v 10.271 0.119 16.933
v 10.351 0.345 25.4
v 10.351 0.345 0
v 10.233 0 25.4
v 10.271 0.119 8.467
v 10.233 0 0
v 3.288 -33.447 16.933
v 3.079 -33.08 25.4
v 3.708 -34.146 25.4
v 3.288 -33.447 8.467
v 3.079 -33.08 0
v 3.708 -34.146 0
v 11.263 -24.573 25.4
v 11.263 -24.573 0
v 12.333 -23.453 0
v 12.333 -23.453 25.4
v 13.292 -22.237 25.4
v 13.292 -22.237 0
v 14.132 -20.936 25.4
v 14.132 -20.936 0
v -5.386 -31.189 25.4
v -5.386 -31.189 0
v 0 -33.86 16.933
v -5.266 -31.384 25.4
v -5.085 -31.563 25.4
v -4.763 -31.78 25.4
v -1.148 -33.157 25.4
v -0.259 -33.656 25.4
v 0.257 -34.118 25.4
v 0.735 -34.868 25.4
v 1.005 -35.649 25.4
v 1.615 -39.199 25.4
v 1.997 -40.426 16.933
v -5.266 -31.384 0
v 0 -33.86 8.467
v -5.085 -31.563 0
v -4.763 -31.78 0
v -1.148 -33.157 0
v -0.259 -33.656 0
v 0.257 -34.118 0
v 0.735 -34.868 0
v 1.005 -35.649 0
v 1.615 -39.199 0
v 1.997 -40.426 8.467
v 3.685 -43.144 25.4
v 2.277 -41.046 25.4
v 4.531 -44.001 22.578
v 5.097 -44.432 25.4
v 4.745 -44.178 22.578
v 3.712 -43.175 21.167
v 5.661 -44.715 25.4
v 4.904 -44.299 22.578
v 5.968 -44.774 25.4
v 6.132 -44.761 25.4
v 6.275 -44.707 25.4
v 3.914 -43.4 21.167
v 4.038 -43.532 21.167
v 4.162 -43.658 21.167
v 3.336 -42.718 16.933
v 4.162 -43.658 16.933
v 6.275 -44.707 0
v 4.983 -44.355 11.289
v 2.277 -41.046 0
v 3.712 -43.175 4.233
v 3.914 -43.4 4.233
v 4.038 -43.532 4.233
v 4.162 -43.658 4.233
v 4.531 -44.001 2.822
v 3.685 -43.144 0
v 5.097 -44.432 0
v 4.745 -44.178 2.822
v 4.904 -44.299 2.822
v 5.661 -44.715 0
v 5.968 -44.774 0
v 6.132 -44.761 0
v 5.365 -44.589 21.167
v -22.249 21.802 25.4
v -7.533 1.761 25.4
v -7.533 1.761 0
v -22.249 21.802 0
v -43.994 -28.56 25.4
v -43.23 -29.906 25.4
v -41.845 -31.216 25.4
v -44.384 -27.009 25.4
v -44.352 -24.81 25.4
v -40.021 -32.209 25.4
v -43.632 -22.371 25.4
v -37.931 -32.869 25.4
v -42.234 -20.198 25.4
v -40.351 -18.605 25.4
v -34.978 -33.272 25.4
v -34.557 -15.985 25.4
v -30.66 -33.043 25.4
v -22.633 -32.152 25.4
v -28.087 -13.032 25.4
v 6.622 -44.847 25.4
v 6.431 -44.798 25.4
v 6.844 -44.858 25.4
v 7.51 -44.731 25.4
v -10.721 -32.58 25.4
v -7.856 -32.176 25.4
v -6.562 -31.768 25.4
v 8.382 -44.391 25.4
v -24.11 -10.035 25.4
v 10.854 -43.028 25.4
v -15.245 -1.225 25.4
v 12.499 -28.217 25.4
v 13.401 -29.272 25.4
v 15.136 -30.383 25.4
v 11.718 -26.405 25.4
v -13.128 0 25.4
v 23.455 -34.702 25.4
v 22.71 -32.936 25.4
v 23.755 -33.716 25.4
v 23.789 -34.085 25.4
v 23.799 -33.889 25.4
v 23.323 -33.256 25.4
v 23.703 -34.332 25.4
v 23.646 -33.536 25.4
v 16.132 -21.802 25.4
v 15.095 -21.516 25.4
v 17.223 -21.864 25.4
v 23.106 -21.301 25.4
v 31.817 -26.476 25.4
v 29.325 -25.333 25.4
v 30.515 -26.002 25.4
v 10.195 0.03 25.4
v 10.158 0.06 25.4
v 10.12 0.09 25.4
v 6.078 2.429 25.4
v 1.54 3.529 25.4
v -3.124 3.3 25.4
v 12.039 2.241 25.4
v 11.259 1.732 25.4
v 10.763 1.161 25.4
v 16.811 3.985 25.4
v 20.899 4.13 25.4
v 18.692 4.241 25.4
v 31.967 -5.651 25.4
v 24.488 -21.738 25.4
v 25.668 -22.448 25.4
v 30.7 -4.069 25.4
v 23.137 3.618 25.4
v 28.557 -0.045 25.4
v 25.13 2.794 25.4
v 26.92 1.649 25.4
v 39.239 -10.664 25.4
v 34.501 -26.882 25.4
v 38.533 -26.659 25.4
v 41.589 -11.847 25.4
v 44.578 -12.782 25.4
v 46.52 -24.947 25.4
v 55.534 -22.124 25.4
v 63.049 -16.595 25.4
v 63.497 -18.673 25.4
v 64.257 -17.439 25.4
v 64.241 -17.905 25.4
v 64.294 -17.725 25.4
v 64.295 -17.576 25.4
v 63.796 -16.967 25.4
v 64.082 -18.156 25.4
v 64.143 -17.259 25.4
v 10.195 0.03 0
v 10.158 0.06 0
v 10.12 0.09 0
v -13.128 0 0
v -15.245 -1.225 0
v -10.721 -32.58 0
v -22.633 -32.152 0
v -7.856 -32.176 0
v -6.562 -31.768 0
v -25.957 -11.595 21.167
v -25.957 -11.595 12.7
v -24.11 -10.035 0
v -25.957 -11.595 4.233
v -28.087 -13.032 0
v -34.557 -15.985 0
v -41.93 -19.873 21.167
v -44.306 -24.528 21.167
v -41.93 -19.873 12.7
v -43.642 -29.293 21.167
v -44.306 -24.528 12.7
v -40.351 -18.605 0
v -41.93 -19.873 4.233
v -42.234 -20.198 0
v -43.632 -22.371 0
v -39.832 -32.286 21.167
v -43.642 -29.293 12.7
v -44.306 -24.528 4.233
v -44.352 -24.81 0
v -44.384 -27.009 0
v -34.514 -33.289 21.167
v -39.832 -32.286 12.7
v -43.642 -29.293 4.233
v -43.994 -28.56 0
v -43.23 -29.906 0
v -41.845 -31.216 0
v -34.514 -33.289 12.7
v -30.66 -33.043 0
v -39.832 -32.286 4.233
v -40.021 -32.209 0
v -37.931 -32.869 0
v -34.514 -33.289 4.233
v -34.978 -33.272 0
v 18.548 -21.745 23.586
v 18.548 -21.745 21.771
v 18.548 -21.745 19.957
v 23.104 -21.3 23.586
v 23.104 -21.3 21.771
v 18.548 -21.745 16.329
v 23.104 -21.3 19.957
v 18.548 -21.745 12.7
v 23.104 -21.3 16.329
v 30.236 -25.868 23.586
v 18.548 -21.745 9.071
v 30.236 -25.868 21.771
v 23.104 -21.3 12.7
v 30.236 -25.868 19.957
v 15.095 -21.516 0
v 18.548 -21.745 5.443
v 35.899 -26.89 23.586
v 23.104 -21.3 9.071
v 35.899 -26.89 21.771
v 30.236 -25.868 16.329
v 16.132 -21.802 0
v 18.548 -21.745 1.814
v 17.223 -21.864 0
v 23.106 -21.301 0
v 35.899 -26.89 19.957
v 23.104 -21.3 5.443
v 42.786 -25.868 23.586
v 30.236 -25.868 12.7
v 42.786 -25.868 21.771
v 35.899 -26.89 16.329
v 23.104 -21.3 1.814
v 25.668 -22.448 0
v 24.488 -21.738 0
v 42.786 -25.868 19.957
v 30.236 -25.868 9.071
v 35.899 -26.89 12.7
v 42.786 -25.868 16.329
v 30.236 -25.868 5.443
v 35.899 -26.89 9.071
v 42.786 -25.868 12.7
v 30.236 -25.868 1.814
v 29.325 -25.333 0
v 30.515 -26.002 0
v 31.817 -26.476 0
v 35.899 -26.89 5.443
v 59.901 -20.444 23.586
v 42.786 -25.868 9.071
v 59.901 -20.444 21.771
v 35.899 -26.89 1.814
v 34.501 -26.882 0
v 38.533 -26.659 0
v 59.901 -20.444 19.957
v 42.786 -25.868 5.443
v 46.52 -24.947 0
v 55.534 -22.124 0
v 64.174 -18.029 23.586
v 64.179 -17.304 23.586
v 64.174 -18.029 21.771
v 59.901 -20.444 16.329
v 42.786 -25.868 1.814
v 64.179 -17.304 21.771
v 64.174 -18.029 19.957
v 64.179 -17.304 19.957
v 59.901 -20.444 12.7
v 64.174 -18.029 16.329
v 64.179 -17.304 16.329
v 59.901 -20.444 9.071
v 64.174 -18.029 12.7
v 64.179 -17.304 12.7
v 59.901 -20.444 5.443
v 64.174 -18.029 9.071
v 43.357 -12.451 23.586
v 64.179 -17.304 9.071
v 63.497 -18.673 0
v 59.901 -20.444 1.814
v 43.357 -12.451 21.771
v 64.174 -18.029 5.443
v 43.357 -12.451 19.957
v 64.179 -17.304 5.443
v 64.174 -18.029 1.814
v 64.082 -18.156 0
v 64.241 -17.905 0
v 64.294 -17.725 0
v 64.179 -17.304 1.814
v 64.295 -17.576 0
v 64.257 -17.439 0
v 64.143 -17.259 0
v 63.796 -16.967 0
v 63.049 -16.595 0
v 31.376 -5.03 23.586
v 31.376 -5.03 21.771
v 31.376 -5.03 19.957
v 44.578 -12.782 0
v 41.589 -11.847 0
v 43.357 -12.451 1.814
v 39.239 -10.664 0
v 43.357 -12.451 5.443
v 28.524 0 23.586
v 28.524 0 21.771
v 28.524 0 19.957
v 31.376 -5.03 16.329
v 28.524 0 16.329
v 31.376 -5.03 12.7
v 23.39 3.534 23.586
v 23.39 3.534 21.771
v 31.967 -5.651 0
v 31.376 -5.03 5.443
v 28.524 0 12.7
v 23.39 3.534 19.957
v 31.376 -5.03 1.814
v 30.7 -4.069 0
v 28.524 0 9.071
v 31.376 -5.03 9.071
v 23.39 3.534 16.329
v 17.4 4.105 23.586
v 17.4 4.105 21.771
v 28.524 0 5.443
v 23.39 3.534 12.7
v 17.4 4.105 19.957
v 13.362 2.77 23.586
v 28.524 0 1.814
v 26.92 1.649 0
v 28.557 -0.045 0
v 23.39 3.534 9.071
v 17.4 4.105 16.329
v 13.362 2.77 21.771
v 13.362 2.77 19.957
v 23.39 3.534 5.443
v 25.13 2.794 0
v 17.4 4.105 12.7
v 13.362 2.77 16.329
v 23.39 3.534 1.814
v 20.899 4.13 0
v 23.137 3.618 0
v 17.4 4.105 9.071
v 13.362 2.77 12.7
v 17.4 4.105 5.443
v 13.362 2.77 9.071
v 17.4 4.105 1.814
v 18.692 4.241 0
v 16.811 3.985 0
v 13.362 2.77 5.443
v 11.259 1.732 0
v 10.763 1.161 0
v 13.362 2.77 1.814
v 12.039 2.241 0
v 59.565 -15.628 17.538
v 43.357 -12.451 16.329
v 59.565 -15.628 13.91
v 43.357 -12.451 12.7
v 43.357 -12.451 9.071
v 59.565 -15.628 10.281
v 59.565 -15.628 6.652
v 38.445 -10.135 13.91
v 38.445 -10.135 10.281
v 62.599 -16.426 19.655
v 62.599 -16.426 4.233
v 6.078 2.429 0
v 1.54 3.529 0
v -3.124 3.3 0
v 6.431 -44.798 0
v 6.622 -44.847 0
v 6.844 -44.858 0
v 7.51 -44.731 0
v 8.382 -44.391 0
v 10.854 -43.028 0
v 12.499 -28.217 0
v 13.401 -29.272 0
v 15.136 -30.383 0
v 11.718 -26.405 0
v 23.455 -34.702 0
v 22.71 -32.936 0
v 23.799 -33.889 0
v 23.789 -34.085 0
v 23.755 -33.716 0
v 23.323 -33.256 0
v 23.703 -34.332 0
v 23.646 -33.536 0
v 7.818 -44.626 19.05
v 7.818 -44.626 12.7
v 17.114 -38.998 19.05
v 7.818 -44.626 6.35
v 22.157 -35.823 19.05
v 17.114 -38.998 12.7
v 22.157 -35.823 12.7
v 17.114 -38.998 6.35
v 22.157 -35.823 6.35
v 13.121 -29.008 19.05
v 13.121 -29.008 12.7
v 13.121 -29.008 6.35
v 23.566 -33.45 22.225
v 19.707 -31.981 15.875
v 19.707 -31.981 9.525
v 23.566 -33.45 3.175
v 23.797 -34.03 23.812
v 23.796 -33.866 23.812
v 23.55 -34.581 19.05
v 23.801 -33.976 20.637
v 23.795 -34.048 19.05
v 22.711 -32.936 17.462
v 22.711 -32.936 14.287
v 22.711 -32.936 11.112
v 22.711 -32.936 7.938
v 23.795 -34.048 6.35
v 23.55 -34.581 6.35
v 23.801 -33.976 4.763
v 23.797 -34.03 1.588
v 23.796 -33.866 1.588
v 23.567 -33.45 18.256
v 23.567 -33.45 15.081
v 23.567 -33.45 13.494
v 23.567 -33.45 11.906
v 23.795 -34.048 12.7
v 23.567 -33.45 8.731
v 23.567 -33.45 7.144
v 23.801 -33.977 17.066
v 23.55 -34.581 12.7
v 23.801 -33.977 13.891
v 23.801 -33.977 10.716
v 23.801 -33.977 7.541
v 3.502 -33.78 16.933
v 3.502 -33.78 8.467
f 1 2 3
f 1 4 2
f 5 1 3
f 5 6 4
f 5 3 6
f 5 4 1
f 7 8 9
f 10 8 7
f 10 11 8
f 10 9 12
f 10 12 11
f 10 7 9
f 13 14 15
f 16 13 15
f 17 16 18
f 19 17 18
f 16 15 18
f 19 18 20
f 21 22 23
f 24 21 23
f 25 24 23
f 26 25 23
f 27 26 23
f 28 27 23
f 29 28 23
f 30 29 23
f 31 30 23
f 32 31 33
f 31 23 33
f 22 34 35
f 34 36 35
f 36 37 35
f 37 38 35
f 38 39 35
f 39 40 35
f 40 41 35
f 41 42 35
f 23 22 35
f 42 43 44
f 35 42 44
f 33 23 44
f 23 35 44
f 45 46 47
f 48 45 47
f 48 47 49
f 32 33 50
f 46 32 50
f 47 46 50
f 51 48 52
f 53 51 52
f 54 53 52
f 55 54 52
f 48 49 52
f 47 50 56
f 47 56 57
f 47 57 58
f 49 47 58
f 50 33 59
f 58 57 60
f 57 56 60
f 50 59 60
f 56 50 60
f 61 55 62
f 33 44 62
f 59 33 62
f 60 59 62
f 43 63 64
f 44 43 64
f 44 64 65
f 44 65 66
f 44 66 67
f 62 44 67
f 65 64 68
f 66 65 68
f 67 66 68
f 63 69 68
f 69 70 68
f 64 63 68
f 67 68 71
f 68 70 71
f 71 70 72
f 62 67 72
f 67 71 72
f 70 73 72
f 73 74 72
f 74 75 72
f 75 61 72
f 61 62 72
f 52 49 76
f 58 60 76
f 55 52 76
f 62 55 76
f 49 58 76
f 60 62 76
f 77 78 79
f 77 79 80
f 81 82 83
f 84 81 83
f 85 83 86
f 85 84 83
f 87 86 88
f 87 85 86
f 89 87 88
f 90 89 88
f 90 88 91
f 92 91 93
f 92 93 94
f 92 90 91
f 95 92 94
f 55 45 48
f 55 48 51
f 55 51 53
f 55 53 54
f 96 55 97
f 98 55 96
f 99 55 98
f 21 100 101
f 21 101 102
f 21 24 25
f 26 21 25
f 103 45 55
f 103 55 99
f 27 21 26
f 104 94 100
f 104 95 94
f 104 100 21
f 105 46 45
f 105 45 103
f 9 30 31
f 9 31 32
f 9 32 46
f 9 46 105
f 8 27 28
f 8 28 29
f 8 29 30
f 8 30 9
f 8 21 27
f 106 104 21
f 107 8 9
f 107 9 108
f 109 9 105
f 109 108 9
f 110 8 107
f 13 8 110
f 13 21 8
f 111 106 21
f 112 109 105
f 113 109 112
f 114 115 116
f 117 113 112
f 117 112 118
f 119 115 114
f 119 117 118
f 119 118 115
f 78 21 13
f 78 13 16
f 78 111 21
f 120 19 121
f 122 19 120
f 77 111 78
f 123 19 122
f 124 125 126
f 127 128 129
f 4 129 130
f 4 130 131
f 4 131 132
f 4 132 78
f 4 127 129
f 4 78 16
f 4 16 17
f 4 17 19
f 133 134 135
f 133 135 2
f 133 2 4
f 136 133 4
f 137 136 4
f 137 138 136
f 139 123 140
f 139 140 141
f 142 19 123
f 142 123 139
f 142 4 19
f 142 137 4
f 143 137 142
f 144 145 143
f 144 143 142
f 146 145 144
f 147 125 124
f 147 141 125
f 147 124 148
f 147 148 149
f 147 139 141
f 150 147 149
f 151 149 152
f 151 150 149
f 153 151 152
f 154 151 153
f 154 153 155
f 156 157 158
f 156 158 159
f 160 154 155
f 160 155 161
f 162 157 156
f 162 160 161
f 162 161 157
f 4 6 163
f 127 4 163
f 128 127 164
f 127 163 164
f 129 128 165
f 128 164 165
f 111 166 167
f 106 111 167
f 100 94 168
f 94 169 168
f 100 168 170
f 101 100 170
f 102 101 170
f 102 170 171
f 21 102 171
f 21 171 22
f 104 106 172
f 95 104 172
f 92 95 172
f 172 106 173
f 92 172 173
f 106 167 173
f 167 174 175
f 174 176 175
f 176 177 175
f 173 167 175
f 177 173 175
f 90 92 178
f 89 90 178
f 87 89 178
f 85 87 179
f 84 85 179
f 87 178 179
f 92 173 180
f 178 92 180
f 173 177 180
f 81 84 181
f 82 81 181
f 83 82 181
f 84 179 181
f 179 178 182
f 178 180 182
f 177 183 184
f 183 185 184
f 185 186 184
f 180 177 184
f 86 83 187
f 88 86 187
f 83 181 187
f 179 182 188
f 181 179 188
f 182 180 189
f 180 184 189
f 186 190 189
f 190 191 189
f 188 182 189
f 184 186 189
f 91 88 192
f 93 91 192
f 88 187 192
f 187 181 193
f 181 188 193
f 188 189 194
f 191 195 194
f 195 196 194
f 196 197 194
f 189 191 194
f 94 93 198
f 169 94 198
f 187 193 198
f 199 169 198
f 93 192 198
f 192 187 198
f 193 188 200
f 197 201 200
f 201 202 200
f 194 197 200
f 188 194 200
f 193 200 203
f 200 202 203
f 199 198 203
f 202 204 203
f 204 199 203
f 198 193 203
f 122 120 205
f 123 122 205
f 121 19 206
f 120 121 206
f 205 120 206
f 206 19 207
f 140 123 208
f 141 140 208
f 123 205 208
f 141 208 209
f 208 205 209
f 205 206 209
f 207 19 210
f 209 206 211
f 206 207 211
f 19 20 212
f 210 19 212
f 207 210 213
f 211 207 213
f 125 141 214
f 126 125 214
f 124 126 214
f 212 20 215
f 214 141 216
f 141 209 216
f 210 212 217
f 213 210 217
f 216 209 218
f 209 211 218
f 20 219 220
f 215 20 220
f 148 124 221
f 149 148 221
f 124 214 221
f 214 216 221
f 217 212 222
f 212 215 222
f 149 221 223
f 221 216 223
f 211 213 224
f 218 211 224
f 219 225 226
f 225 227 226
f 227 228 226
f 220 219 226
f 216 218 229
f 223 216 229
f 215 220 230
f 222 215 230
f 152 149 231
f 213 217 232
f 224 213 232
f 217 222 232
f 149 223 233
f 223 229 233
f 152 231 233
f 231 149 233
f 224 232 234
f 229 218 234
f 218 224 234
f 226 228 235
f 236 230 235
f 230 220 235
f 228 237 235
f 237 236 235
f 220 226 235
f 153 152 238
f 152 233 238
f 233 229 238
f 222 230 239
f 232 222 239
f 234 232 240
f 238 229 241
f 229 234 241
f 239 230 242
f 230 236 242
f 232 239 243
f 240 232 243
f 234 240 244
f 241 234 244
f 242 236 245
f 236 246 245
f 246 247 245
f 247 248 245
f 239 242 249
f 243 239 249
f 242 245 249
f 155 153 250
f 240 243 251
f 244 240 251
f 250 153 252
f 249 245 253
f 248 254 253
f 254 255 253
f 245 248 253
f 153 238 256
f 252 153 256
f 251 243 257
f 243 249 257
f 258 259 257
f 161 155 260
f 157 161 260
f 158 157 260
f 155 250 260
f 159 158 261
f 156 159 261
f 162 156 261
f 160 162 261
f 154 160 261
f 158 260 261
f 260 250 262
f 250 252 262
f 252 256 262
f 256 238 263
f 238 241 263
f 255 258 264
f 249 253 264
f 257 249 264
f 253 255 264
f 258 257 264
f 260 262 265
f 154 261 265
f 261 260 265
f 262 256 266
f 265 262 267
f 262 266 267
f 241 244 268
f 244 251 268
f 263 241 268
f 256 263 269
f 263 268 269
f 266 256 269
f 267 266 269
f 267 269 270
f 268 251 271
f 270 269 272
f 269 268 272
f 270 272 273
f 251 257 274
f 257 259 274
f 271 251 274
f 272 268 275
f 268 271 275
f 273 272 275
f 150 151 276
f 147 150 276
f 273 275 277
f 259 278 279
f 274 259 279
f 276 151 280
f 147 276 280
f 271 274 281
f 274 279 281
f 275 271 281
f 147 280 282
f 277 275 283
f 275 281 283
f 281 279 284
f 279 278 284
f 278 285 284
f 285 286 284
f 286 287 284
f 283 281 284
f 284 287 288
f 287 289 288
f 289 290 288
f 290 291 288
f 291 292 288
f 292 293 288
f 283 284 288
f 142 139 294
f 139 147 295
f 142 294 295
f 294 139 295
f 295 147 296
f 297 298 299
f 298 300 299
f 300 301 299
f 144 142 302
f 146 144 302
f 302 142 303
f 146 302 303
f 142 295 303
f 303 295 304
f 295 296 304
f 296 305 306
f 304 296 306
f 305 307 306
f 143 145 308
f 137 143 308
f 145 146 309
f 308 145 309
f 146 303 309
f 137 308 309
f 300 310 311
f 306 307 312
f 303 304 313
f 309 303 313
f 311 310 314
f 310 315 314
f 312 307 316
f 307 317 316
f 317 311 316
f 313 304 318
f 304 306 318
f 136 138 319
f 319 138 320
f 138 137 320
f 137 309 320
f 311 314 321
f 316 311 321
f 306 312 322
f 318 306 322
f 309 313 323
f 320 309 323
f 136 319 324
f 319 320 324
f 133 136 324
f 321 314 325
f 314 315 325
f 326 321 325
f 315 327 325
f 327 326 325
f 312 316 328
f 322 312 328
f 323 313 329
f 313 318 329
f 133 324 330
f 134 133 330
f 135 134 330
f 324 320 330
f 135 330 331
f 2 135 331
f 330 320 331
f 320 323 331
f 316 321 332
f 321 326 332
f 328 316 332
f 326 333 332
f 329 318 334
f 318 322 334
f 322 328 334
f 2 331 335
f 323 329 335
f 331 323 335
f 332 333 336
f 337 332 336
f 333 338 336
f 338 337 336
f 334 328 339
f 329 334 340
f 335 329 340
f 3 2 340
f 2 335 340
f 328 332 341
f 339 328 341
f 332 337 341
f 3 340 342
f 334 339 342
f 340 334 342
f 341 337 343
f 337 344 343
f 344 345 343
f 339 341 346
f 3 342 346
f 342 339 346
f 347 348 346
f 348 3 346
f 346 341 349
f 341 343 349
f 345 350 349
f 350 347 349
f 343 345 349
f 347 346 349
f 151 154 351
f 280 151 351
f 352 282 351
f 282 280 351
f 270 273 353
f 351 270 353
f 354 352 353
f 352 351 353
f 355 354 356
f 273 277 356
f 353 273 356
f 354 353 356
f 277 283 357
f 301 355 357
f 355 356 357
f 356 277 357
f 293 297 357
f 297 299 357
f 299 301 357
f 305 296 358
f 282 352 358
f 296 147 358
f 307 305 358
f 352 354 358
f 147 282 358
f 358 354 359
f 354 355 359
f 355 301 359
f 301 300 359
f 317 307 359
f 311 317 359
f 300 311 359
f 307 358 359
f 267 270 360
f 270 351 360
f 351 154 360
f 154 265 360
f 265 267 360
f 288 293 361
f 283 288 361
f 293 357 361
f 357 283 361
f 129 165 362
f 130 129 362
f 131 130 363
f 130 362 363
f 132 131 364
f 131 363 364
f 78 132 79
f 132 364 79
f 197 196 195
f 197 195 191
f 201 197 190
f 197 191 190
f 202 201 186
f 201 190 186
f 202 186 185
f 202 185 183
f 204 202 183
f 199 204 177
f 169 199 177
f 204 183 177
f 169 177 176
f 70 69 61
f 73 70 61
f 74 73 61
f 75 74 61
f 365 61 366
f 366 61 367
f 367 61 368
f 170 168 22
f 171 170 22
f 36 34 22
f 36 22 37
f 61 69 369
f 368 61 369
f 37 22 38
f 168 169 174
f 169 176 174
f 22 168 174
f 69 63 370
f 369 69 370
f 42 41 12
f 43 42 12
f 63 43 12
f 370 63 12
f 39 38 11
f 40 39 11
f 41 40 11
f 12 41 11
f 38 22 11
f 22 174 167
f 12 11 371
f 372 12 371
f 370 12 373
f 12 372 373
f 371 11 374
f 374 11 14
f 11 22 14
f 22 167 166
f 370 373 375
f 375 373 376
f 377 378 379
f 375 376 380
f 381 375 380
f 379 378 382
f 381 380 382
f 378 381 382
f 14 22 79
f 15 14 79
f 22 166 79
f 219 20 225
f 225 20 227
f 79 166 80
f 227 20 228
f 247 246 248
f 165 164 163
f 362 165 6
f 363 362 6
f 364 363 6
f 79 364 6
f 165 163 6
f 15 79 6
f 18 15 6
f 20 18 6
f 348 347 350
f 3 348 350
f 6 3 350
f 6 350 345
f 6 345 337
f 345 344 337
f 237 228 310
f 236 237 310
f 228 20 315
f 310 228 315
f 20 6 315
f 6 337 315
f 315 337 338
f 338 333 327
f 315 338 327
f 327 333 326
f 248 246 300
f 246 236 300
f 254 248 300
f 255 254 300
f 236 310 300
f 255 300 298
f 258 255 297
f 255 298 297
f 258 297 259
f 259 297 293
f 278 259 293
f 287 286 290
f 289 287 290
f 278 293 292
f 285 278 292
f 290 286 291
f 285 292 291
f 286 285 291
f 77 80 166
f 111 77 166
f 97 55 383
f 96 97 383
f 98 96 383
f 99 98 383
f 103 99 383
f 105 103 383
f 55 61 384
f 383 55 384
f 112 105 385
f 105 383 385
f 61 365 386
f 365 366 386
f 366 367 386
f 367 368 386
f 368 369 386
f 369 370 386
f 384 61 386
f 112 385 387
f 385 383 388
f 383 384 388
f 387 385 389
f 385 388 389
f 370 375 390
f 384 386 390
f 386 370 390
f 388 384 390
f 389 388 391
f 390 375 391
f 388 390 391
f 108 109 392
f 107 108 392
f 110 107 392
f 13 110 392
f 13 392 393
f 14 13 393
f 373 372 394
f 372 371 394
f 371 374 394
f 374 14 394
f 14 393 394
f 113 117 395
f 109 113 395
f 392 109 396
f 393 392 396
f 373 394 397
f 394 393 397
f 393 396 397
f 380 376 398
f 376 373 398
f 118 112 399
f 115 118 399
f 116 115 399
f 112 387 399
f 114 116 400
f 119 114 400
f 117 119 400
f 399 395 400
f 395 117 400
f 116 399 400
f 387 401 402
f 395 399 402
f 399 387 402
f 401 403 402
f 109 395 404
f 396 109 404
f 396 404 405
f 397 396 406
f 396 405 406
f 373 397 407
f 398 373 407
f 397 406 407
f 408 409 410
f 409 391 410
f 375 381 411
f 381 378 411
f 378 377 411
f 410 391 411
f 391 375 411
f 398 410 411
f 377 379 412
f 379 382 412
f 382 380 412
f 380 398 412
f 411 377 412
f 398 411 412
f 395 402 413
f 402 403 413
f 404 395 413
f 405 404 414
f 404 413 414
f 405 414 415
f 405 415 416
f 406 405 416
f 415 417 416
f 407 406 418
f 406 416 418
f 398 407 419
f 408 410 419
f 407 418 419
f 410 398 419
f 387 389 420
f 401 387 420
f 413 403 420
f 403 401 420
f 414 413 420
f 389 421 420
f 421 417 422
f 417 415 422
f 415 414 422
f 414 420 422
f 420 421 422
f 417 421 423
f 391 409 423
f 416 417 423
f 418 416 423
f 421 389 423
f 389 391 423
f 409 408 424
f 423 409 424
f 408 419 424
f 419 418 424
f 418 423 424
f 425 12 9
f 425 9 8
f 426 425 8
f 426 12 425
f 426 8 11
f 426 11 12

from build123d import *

# Parameters (mm, degrees)
F1_DEPTH = 25.4


with BuildPart() as f1:
    # F0 (on Top) → F1 (new body)
    with BuildSketch(Plane.XY):
        with BuildLine():
            ThreePointArc((15.6247597688, -17.5122784292), (16.158858904, -15.1511123847), (16.3382044071, -12.7369454131))
            ThreePointArc((16.3382044071, -12.7369454131), (14.732957367, -5.6745881247), (10.2326509171, 0))
            add(Edge.make_bspline(
                [(11.0694508842, -15.1028212661), (9.5993425881, -9.8895547332), (9.3093062782, -2.986619819), (10.2326509171, 0)],
                knots=[0.9266033138, 0.9266033138, 0.9266033138, 0.9266033138, 1, 1, 1, 1], degree=3))
            ThreePointArc((11.0694508842, -15.1028212661), (13.2014186834, -16.5829843604), (15.6247597688, -17.5122784292))
        make_face()
        with BuildLine():
            ThreePointArc((10.2326509171, 0), (14.732957367, -5.6745881247), (16.3382044071, -12.7369454131))
            ThreePointArc((16.3382044071, -12.7369454131), (16.158858904, -15.1511123847), (15.6247597688, -17.5122784292))
            ThreePointArc((15.6247597688, -17.5122784292), (24.9039357291, -15.5507675945), (29.064724865, -7.0279473439))
            ThreePointArc((29.064724865, -7.0279473439), (22.2178667073, 3.0289081499), (10.3511869131, 0.3453061453))
            add(Edge.make_bspline(
                [(10.2326509171, 0), (10.2701911189, 0.1214262863), (10.3097370055, 0.2363790128), (10.3511869131, 0.3453061453)],
                knots=[0, 0, 0, 0, 0.0029840715, 0.0029840715, 0.0029840715, 0.0029840715], degree=3))
        make_face()
        with BuildLine():
            add(Edge.make_bspline(
                [(11.0694508842, -15.1028212661), (9.5993425881, -9.8895547332), (9.3093062782, -2.986619819), (10.2326509171, 0)],
                knots=[0.9266033138, 0.9266033138, 0.9266033138, 0.9266033138, 1, 1, 1, 1], degree=3))
            ThreePointArc((10.2326509171, 0), (10.1764969932, 0.0449101719), (10.1201459651, 0.0895727775))
            ThreePointArc((10.1201459651, 0.0895727775), (7.4671185374, -7.7020590055), (11.0694508842, -15.1028212661))
        make_face()
        with BuildLine():
            ThreePointArc((29.064724865, -7.0279473439), (24.9039357291, -15.5507675945), (15.6247597688, -17.5122784292))
            ThreePointArc((15.6247597688, -17.5122784292), (14.97657106, -19.2668185001), (14.1320946898, -20.9357759959))
            add(Edge.make_bspline(
                [(10.3511869131, 0.3453061453), (10.9660918821, 1.9612285661), (13.1810710321, 2.5821615076), (17.4062250817, 4.5972614145), (23.5541211341, 4.0157306024), (29.1807841604, 0.4734658783), (30.6152690832, -5.6031749227), (37.2457146084, -8.7606918958), (41.6262591245, -13.5919512406), (69.4069767494, -16.0194865708), (58.4173073455, -21.3590816503), (43.2741615609, -26.3017495114), (29.7906561882, -27.9538614081), (23.9099000961, -18.8038777974), (16.6936052342, -23.0245011534), (14.1320946898, -20.9357759959)],
                knots=[0.0029840715, 0.0029840715, 0.0029840715, 0.0029840715, 0.0472524544, 0.0978197845, 0.156226181, 0.2156699733, 0.2729250454, 0.3328538195, 0.399296056, 0.5093923331, 0.5642444856, 0.6651313762, 0.7494833831, 0.8187715875, 0.8901220386, 0.8901220386, 0.8901220386, 0.8901220386], degree=3))
            ThreePointArc((10.3511869131, 0.3453061453), (22.2178667073, 3.0289081499), (29.064724865, -7.0279473439))
        make_face()
        with BuildLine():
            ThreePointArc((14.1320946898, -20.9357759959), (14.97657106, -19.2668185001), (15.6247597688, -17.5122784292))
            ThreePointArc((15.6247597688, -17.5122784292), (13.2014186834, -16.5829843604), (11.0694508842, -15.1028212661))
            add(Edge.make_bspline(
                [(14.1320946898, -20.9357759959), (12.8224019033, -19.8678169833), (11.8001572435, -17.6940364971), (11.0694508842, -15.1028212661)],
                knots=[0.8901220386, 0.8901220386, 0.8901220386, 0.8901220386, 0.9266033138, 0.9266033138, 0.9266033138, 0.9266033138], degree=3))
        make_face()
        with BuildLine():
            ThreePointArc((11.0694508842, -15.1028212661), (7.4671185374, -7.7020590055), (10.1201459651, 0.0895727775))
            ThreePointArc((10.1201459651, 0.0895727775), (1.5397794917, 3.5285395894), (-7.5334858124, 1.7607618112))
            ThreePointArc((-7.5334858124, 1.7607618112), (-8.9265880443, 0.947094529), (-10.2326509171, 0))
            add(Edge.make_bspline(
                [(-3.0699548582, -28.7841352111), (0.8240097012, -21.7530635718), (-4.4613062913, -2.497334585), (-10.2326509171, 0)],
                knots=[0.8075795969, 0.8075795969, 0.8075795969, 0.8075795969, 1, 1, 1, 1], degree=3))
            add(Edge.make_bspline(
                [(-1.0373402516, -29.0421853208), (-1.7263886536, -28.7488598338), (-2.411144298, -28.652496149), (-3.0699548582, -28.7841352111)],
                knots=[0.8274826523, 0.8274826523, 0.8274826523, 0.8274826523, 0.8828352089, 0.8828352089, 0.8828352089, 0.8828352089], degree=3))
            ThreePointArc((-1.0373402516, -29.0421853208), (0.2330522052, -29.0734875783), (1.5020347762, -29.0059593591))
            add(Edge.make_bspline(
                [(1.9966859836, -25.2967402339), (1.3467949947, -26.4147374297), (1.2639465735, -27.7023037912), (1.5020347762, -29.0059593591)],
                knots=[0, 0, 0, 0, 0.0539789023, 0.0539789023, 0.0539789023, 0.0539789023], degree=3))
            add(Edge.make_bspline(
                [(11.2626201962, -24.5729206396), (11.0063895855, -23.5189771031), (9.9645541492, -20.328136721), (3.5168312901, -22.6816582912), (1.9966859836, -25.2967402339)],
                knots=[0.8238879416, 0.8238879416, 0.8238879416, 0.8238879416, 0.873739171, 1, 1, 1, 1], degree=3))
            ThreePointArc((11.2626201962, -24.5729206396), (12.8269283667, -22.8565714892), (14.1320946898, -20.9357759959))
            add(Edge.make_bspline(
                [(14.1320946898, -20.9357759959), (12.8224019033, -19.8678169833), (11.8001572435, -17.6940364971), (11.0694508842, -15.1028212661)],
                knots=[0.8901220386, 0.8901220386, 0.8901220386, 0.8901220386, 0.9266033138, 0.9266033138, 0.9266033138, 0.9266033138], degree=3))
        make_face()
        with BuildLine():
            ThreePointArc((-10.2326509171, 0), (-8.9265880443, 0.947094529), (-7.5334858124, 1.7607618112))
            Line((-7.5334858124, 1.7607618112), (-22.2487710416, 21.8024943024))
            Line((-22.2487710416, 21.8024943024), (-13.127635327, 0))
            add(Edge.make_bspline(
                [(-10.2326509171, 0), (-11.1825010918, 0.4110123109), (-12.1455161813, 0.368094916), (-13.127635327, 0)],
                knots=[0, 0, 0, 0, 0.0316686258, 0.0316686258, 0.0316686258, 0.0316686258], degree=3))
        make_face()
        with BuildLine():
            add(Edge.make_bspline(
                [(6.2752948143, -44.7073355317), (7.4566317865, -45.6619770197), (16.6946003339, -38.7648248858), (28.6623877442, -32.6401294165), (12.4889474561, -31.4488202018), (11.6144968935, -26.0202815526), (11.2626201962, -24.5729206396)],
                knots=[0.3326677956, 0.3326677956, 0.3326677956, 0.3326677956, 0.483522904, 0.6092698166, 0.7554281822, 0.8238879416, 0.8238879416, 0.8238879416, 0.8238879416], degree=3))
            ThreePointArc((11.2626201962, -24.5729206396), (6.756260964, -27.6127600473), (1.5020347762, -29.0059593591))
            add(Edge.make_bspline(
                [(1.5020347762, -29.0059593591), (1.7582976885, -30.409130826), (2.3863654431, -31.8309416267), (3.0793600463, -33.0800123041)],
                knots=[0.0539789023, 0.0539789023, 0.0539789023, 0.0539789023, 0.1120783401, 0.1120783401, 0.1120783401, 0.1120783401], degree=3))
            add(Edge.make_bspline(
                [(3.7081294957, -34.1456867388), (3.5040593333, -33.7751099484), (3.2941622239, -33.4194445981), (3.0793600283, -33.0800122747)],
                knots=[0.6943378528, 0.6943378528, 0.6943378528, 0.6943378528, 0.7136660465, 0.7136660465, 0.7136660465, 0.7136660465], degree=3))
            add(Edge.make_bspline(
                [(3.7081294937, -34.1456867399), (4.9882228558, -36.1974885553), (6.3669138471, -37.6924416259), (6.2780647625, -40.2375798495), (6.2515850068, -40.5877476318)],
                knots=[0.1293935148, 0.1293935148, 0.1293935148, 0.1293935148, 0.2349709338, 0.2514569097, 0.2514569097, 0.2514569097, 0.2514569097], degree=3))
            add(Edge.make_bspline(
                [(6.2752948143, -44.7073355317), (6.8854909927, -44.3655439077), (6.7882111753, -42.687560365), (6.2515850082, -40.5877476332)],
                knots=[0.482945294, 0.482945294, 0.482945294, 0.482945294, 0.590468255, 0.590468255, 0.590468255, 0.590468255], degree=3))
        make_face()
        with BuildLine():
            ThreePointArc((1.5020347762, -29.0059593591), (6.756260964, -27.6127600473), (11.2626201962, -24.5729206396))
            add(Edge.make_bspline(
                [(11.2626201962, -24.5729206396), (11.0063895855, -23.5189771031), (9.9645541492, -20.328136721), (3.5168312901, -22.6816582912), (1.9966859836, -25.2967402339)],
                knots=[0.8238879416, 0.8238879416, 0.8238879416, 0.8238879416, 0.873739171, 1, 1, 1, 1], degree=3))
            add(Edge.make_bspline(
                [(1.9966859836, -25.2967402339), (1.3467949947, -26.4147374297), (1.2639465735, -27.7023037912), (1.5020347762, -29.0059593591)],
                knots=[0, 0, 0, 0, 0.0539789023, 0.0539789023, 0.0539789023, 0.0539789023], degree=3))
        make_face()
        with BuildLine():
            add(Edge.make_bspline(
                [(-3.0699548582, -28.7841352111), (0.8240097012, -21.7530635718), (-4.4613062913, -2.497334585), (-10.2326509171, 0)],
                knots=[0.8075795969, 0.8075795969, 0.8075795969, 0.8075795969, 1, 1, 1, 1], degree=3))
            ThreePointArc((-10.2326509171, 0), (-14.5067813584, -5.2209479499), (-16.3067587039, -11.7237604245))
            ThreePointArc((-16.3067587039, -11.7237604245), (-9.7227081214, -13.4309985411), (-6.8315372381, -19.5877440274))
            ThreePointArc((-6.8315372381, -19.5877440274), (-7.6120209178, -23.0344974741), (-9.8012018612, -25.808799349))
            ThreePointArc((-9.8012018612, -25.808799349), (-6.6052876316, -27.6804088185), (-3.0699548582, -28.7841352111))
        make_face()
        with BuildLine():
            ThreePointArc((-16.3067587039, -11.7237604245), (-14.5067813584, -5.2209479499), (-10.2326509171, 0))
            add(Edge.make_bspline(
                [(-10.2326509171, 0), (-11.1825010918, 0.4110123109), (-12.1455161813, 0.368094916), (-13.127635327, 0)],
                knots=[0, 0, 0, 0, 0.0316686258, 0.0316686258, 0.0316686258, 0.0316686258], degree=3))
            add(Edge.make_bspline(
                [(-13.127635327, 0), (-16.9885407298, -1.4470542155), (-26.1475214336, -15.710526233), (-43.4116839601, -16.662992314), (-45.950942929, -30.8867076179), (-33.5443465173, -34.5459712582), (-23.2656635988, -30.7793989739), (-9.4186082957, -33.630807497), (-5.3864327744, -31.188833942)],
                knots=[0.0316686258, 0.0316686258, 0.0316686258, 0.0316686258, 0.1561642831, 0.3060221782, 0.4153421079, 0.5268671977, 0.655086979, 0.7787124677, 0.7787124677, 0.7787124677, 0.7787124677], degree=3))
            add(Edge.make_bspline(
                [(-3.0699548582, -28.7841352111), (-4.4644595819, -29.062775696), (-5.7427193917, -30.362964597), (-5.3864327744, -31.188833942)],
                knots=[0.8828352089, 0.8828352089, 0.8828352089, 0.8828352089, 1, 1, 1, 1], degree=3))
            ThreePointArc((-3.0699548582, -28.7841352111), (-6.6052876316, -27.6804088185), (-9.8012018612, -25.808799349))
            ThreePointArc((-9.8012018612, -25.808799349), (-22.0961404136, -22.9426465286), (-16.3067587039, -11.7237604245))
        make_face()
        with BuildLine():
            add(Edge.make_bspline(
                [(1.5020347762, -29.0059593591), (1.7582976885, -30.409130826), (2.3863654431, -31.8309416267), (3.0793600463, -33.0800123041)],
                knots=[0.0539789023, 0.0539789023, 0.0539789023, 0.0539789023, 0.1120783401, 0.1120783401, 0.1120783401, 0.1120783401], degree=3))
            ThreePointArc((1.5020347762, -29.0059593591), (0.2330522052, -29.0734875783), (-1.0373402516, -29.0421853208))
            add(Edge.make_bspline(
                [(3.0793600463, -33.0800123041), (1.8144691163, -31.0812204976), (0.3794895238, -29.6453247849), (-1.0373402516, -29.0421853208)],
                knots=[0.7136660465, 0.7136660465, 0.7136660465, 0.7136660465, 0.8274826523, 0.8274826523, 0.8274826523, 0.8274826523], degree=3))
        make_face()
        with BuildLine():
            add(Edge.make_bspline(
                [(-5.3864327744, -31.188833942), (-4.908330002, -32.2970720971), (2.1683533748, -32.8226904652), (0.3871749857, -40.3054793101), (5.3800366063, -45.2088000896), (6.2752948143, -44.7073355317)],
                knots=[0, 0, 0, 0, 0.1572240121, 0.3251914161, 0.482945294, 0.482945294, 0.482945294, 0.482945294], degree=3))
            add(Edge.make_bspline(
                [(6.2515850082, -40.5877476332), (6.1211441743, -42.3126947019), (5.6393374171, -44.1934167006), (6.2752948143, -44.7073355317)],
                knots=[0.2514569097, 0.2514569097, 0.2514569097, 0.2514569097, 0.3326677956, 0.3326677956, 0.3326677956, 0.3326677956], degree=3))
            add(Edge.make_bspline(
                [(6.2515850082, -40.5877476332), (5.7331920658, -38.5592813245), (4.8048013486, -36.1371642314), (3.7081294957, -34.1456867388)],
                knots=[0.590468255, 0.590468255, 0.590468255, 0.590468255, 0.6943378528, 0.6943378528, 0.6943378528, 0.6943378528], degree=3))
            add(Edge.make_bspline(
                [(3.0793600463, -33.0800123041), (3.2858908332, -33.4522685219), (3.4981884, -33.8091819739), (3.7081294937, -34.1456867399)],
                knots=[0.1120783401, 0.1120783401, 0.1120783401, 0.1120783401, 0.1293935148, 0.1293935148, 0.1293935148, 0.1293935148], degree=3))
            add(Edge.make_bspline(
                [(3.0793600463, -33.0800123041), (1.8144691163, -31.0812204976), (0.3794895238, -29.6453247849), (-1.0373402516, -29.0421853208)],
                knots=[0.7136660465, 0.7136660465, 0.7136660465, 0.7136660465, 0.8274826523, 0.8274826523, 0.8274826523, 0.8274826523], degree=3))
            ThreePointArc((-1.0373402516, -29.0421853208), (-2.0576967086, -28.9450547261), (-3.0699548582, -28.7841352111))
            add(Edge.make_bspline(
                [(-5.3864327744, -31.188833942), (-4.4449009501, -30.618621707), (-3.6541318811, -29.838944631), (-3.0699548582, -28.7841352111)],
                knots=[0.7787124677, 0.7787124677, 0.7787124677, 0.7787124677, 0.8075795969, 0.8075795969, 0.8075795969, 0.8075795969], degree=3))
        make_face()
        with BuildLine():
            add(Edge.make_bspline(
                [(6.2515850082, -40.5877476332), (6.1211441743, -42.3126947019), (5.6393374171, -44.1934167006), (6.2752948143, -44.7073355317)],
                knots=[0.2514569097, 0.2514569097, 0.2514569097, 0.2514569097, 0.3326677956, 0.3326677956, 0.3326677956, 0.3326677956], degree=3))
            add(Edge.make_bspline(
                [(6.2752948143, -44.7073355317), (6.8854909927, -44.3655439077), (6.7882111753, -42.687560365), (6.2515850082, -40.5877476332)],
                knots=[0.482945294, 0.482945294, 0.482945294, 0.482945294, 0.590468255, 0.590468255, 0.590468255, 0.590468255], degree=3))
        make_face()
        with BuildLine():
            ThreePointArc((-6.8315372381, -19.5877440274), (-9.7227081214, -13.4309985411), (-16.3067587039, -11.7237604245))
            ThreePointArc((-16.3067587039, -11.7237604245), (-14.8325143382, -19.5877440274), (-9.8012018612, -25.808799349))
            ThreePointArc((-9.8012018612, -25.808799349), (-7.6120209178, -23.0344974741), (-6.8315372381, -19.5877440274))
        make_face()
        with BuildLine():
            ThreePointArc((-9.8012018612, -25.808799349), (-14.8325143382, -19.5877440274), (-16.3067587039, -11.7237604245))
            ThreePointArc((-16.3067587039, -11.7237604245), (-22.0961404136, -22.9426465286), (-9.8012018612, -25.808799349))
        make_face()
        with BuildLine():
            add(Edge.make_bspline(
                [(-1.0373402516, -29.0421853208), (-1.7263886536, -28.7488598338), (-2.411144298, -28.652496149), (-3.0699548582, -28.7841352111)],
                knots=[0.8274826523, 0.8274826523, 0.8274826523, 0.8274826523, 0.8828352089, 0.8828352089, 0.8828352089, 0.8828352089], degree=3))
            ThreePointArc((-3.0699548582, -28.7841352111), (-2.0576967086, -28.9450547261), (-1.0373402516, -29.0421853208))
        make_face()
        with BuildLine():
            add(Edge.make_bspline(
                [(-5.3864327744, -31.188833942), (-4.4449009501, -30.618621707), (-3.6541318811, -29.838944631), (-3.0699548582, -28.7841352111)],
                knots=[0.7787124677, 0.7787124677, 0.7787124677, 0.7787124677, 0.8075795969, 0.8075795969, 0.8075795969, 0.8075795969], degree=3))
            add(Edge.make_bspline(
                [(-3.0699548582, -28.7841352111), (-4.4644595819, -29.062775696), (-5.7427193917, -30.362964597), (-5.3864327744, -31.188833942)],
                knots=[0.8828352089, 0.8828352089, 0.8828352089, 0.8828352089, 1, 1, 1, 1], degree=3))
        make_face()
        with BuildLine():
            add(Edge.make_bspline(
                [(6.2515850082, -40.5877476332), (5.7331920658, -38.5592813245), (4.8048013486, -36.1371642314), (3.7081294957, -34.1456867388)],
                knots=[0.590468255, 0.590468255, 0.590468255, 0.590468255, 0.6943378528, 0.6943378528, 0.6943378528, 0.6943378528], degree=3))
            add(Edge.make_bspline(
                [(3.7081294937, -34.1456867399), (4.9882228558, -36.1974885553), (6.3669138471, -37.6924416259), (6.2780647625, -40.2375798495), (6.2515850068, -40.5877476318)],
                knots=[0.1293935148, 0.1293935148, 0.1293935148, 0.1293935148, 0.2349709338, 0.2514569097, 0.2514569097, 0.2514569097, 0.2514569097], degree=3))
        make_face()
    extrude(amount=F1_DEPTH)


solid = f1.part
